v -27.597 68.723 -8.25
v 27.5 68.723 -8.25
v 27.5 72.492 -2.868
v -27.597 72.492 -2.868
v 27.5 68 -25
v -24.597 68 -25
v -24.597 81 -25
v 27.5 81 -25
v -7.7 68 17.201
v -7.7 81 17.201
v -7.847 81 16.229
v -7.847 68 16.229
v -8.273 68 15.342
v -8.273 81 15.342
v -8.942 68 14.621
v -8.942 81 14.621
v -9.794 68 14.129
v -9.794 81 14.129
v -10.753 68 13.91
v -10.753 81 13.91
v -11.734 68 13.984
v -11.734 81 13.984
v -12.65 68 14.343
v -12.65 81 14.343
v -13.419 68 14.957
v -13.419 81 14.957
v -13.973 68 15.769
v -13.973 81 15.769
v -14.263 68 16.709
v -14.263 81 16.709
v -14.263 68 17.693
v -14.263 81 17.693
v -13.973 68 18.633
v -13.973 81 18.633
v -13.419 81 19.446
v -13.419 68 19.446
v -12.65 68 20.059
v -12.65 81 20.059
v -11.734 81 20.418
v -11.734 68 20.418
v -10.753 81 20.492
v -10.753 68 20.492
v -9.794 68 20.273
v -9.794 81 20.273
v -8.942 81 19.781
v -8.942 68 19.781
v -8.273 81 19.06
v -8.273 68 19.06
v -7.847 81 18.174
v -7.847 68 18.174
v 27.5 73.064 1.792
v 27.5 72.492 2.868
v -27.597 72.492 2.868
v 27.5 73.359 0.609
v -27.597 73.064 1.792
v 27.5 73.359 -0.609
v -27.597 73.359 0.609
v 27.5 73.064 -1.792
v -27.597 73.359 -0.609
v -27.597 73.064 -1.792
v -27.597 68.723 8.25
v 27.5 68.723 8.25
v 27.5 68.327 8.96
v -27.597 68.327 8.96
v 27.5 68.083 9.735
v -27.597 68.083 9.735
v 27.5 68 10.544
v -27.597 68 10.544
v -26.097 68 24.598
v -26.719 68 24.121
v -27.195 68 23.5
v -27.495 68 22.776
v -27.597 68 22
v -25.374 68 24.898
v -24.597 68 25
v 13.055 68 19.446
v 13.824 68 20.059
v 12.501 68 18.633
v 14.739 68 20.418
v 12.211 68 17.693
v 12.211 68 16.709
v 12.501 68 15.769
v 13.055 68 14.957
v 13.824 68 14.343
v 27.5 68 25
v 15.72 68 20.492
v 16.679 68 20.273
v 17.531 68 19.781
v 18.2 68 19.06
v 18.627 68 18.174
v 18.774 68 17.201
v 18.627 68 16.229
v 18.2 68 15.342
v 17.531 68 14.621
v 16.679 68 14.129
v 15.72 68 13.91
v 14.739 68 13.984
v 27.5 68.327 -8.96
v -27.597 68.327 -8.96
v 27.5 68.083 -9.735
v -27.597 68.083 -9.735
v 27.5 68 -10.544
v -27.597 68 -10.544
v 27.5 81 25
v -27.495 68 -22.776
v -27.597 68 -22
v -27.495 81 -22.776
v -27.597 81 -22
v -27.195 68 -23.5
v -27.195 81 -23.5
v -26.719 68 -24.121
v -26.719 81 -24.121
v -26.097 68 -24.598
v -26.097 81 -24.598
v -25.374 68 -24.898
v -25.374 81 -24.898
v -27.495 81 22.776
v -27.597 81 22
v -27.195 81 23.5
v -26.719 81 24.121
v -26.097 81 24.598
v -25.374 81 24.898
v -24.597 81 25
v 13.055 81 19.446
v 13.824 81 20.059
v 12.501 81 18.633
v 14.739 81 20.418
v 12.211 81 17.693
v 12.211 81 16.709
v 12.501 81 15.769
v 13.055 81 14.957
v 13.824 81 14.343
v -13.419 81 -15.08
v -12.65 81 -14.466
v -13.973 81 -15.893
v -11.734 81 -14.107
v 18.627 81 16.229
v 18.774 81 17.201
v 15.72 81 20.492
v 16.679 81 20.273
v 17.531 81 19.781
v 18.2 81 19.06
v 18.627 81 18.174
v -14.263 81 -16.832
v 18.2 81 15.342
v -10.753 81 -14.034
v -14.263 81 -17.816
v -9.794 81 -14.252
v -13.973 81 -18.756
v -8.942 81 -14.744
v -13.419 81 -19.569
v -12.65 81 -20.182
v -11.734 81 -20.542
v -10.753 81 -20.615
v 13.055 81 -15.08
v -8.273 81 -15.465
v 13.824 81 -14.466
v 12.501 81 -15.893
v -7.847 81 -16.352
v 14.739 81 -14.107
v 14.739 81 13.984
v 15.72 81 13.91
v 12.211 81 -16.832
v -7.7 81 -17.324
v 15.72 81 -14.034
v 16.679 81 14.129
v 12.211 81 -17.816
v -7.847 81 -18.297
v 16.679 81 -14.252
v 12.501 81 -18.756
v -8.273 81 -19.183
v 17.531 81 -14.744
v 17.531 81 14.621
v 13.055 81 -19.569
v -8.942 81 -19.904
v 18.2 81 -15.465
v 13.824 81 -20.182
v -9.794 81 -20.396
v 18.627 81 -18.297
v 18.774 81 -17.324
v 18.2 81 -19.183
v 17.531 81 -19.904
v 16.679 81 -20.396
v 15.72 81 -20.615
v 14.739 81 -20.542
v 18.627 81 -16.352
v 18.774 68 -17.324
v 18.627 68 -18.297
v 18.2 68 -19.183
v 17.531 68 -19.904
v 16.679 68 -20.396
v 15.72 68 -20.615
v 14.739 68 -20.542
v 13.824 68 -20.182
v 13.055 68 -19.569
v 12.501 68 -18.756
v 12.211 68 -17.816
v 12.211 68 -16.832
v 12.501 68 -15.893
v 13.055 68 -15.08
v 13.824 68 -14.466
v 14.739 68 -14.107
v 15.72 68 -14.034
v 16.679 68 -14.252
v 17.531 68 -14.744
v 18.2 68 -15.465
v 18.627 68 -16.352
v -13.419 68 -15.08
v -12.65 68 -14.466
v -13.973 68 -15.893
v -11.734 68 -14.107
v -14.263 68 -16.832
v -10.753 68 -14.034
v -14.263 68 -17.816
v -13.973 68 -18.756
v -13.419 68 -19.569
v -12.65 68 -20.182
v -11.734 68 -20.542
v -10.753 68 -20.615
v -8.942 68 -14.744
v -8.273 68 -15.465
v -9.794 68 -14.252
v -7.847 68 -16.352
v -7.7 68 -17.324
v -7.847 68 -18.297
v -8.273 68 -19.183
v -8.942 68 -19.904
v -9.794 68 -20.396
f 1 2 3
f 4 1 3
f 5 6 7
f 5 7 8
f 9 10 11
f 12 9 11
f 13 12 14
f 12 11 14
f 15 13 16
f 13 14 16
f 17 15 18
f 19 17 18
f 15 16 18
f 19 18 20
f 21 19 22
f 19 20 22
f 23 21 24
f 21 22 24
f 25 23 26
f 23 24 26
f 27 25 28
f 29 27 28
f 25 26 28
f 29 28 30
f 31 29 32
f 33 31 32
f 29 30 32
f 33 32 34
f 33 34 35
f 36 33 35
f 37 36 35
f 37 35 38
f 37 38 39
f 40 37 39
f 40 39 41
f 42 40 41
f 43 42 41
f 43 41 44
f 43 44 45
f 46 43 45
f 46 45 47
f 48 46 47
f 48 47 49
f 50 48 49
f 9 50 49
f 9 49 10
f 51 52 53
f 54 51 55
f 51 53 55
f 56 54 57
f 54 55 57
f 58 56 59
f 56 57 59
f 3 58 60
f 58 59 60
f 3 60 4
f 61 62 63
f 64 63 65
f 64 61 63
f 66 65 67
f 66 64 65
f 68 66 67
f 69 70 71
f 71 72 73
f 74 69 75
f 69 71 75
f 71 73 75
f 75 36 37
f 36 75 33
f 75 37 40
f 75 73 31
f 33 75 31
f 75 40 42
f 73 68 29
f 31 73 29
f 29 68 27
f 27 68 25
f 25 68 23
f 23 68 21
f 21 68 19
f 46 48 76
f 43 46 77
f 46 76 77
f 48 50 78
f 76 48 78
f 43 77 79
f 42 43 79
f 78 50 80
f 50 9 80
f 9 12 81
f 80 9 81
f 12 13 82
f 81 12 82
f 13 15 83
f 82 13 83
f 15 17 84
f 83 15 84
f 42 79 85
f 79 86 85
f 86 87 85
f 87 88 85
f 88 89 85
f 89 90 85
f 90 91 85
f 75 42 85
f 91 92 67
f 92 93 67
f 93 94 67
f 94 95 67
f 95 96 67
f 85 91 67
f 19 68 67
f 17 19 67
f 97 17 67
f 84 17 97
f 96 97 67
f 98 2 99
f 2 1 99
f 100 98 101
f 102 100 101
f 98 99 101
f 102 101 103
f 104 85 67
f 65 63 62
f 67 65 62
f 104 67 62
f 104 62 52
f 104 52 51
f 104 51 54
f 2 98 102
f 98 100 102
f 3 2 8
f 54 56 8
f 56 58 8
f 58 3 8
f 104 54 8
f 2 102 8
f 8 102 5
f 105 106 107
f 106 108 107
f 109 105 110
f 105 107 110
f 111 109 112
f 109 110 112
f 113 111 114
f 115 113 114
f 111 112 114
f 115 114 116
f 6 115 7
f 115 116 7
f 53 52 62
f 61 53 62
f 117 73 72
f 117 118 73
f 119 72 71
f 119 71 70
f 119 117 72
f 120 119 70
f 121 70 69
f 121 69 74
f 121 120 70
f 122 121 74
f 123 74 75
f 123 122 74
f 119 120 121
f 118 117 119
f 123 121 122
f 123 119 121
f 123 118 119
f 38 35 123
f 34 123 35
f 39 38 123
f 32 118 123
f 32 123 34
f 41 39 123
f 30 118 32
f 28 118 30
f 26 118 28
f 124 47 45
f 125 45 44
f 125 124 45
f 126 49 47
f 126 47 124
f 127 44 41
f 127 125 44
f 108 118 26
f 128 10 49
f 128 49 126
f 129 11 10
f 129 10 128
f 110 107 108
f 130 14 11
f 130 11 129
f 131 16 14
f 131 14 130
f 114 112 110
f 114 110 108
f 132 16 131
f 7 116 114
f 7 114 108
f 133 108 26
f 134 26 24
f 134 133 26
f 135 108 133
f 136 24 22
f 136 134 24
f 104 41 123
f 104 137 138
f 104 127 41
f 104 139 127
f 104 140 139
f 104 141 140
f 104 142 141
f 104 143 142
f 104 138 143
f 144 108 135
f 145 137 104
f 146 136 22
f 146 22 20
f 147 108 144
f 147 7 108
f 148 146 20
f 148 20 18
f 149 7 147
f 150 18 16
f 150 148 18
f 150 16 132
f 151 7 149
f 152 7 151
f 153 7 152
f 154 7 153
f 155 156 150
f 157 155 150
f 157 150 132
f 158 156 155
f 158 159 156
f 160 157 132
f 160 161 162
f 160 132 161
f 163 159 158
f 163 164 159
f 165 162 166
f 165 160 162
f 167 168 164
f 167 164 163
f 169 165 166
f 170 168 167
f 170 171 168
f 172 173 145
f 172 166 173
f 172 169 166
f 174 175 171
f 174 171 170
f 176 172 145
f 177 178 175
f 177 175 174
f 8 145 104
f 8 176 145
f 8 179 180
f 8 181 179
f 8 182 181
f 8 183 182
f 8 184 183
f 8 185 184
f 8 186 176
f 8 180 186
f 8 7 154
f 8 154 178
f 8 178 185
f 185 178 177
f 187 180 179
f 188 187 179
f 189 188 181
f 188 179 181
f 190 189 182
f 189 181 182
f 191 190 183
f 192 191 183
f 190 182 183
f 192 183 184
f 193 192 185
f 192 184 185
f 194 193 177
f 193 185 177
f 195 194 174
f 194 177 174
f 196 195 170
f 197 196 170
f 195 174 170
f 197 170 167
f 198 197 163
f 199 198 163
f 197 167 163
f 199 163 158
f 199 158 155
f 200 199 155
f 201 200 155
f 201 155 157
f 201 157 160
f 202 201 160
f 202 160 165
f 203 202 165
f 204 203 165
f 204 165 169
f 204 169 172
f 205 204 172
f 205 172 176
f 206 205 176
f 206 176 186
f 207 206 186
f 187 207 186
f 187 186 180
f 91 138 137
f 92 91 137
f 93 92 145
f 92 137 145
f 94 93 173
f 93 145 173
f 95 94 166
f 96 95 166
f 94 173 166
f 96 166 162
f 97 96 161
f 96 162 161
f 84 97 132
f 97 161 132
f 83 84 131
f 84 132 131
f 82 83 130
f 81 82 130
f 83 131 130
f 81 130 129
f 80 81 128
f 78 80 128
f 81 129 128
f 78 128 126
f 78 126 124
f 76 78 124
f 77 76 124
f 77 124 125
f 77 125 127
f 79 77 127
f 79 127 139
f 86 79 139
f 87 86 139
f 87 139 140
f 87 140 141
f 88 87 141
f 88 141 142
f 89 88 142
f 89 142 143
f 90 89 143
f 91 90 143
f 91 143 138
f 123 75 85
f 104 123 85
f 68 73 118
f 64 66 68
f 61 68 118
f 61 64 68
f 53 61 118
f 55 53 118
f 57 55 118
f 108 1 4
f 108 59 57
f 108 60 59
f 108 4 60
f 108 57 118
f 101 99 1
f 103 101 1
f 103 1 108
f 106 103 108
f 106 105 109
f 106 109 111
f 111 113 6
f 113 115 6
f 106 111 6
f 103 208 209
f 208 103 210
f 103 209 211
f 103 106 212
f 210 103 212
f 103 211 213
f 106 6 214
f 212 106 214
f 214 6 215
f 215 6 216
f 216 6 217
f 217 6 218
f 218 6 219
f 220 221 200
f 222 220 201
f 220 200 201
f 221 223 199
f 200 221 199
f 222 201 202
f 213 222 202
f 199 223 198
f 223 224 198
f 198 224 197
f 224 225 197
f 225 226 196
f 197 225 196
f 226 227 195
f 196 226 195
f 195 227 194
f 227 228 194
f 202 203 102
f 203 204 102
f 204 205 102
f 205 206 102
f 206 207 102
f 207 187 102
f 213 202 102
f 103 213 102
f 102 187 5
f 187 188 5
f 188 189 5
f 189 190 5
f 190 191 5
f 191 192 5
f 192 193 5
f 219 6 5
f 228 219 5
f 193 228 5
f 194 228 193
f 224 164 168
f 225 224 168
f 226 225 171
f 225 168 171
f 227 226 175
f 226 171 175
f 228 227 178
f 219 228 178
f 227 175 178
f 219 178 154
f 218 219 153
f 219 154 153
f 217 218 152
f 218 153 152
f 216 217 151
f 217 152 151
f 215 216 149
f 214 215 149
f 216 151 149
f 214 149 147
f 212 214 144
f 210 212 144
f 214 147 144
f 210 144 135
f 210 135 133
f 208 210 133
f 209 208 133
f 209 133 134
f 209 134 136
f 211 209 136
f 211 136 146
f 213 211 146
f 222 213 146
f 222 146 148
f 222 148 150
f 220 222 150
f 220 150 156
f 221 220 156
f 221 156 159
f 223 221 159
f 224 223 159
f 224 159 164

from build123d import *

# Parameters (mm, degrees)
SKETCH6_W          = 55.097235346
SKETCH6_H          = 50
MAIN_BODY_DEPTH    = 13
MAIN_HOLE_DEPTH    = 56.097235346
EXTERIOR_FILLET_R  = 3
SKETCH9_R          = 3.3
BOLT_HOLES_DEPTH   = 14
TOP_HOLE_FILLET_R  = 5
SIDE_HOLE_FILLET_R = 4


with BuildPart() as part:
    # Sketch6 → Main Body (new body)
    with BuildSketch(Plane(origin=(0, 68, 0), x_dir=(1, 0, 0), z_dir=(0, 1, 0))):
        with Locations((-0.048617673, 0)):
            Rectangle(SKETCH6_W, SKETCH6_H)
    extrude(amount=MAIN_BODY_DEPTH)

    # Sketch7 → Main Hole (cut, through all)
    with BuildSketch(Plane(origin=(27.5, 0, 0), x_dir=(0, 0, -1), z_dir=(1, 0, 0))):
        Polygon((0, 74.5), (-9.282962044, 68), (0, 61.5), (9.282962044, 68), align=None)
    extrude(amount=-MAIN_HOLE_DEPTH, mode=Mode.SUBTRACT)

    # Exterior Fillet
    exterior_fillet_edges = [part.edges().sort_by_distance(p)[0] for p in [
        (-27.597235346, 74.5, 25),
        (-27.597235346, 74.5, -25),
    ]]
    fillet(exterior_fillet_edges, radius=EXTERIOR_FILLET_R)

    # Sketch9 → Bolt Holes (cut, through all)
    with BuildSketch(Plane(origin=(0, 81, 0), x_dir=(1, 0, 0), z_dir=(0, 1, 0))):
        with Locations((15.473743703, -17.201232435)):
            Circle(SKETCH9_R)
        with Locations((-11, -17.201232435)):
            Circle(SKETCH9_R)
        with Locations((15.473743703, 17.324336932)):
            Circle(SKETCH9_R)
        with Locations((-11, 17.324336932)):
            Circle(SKETCH9_R)
    extrude(amount=-BOLT_HOLES_DEPTH, mode=Mode.SUBTRACT)

    # Top Hole Fillet
    top_hole_fillet_edges = [part.edges().sort_by_distance(p)[0] for p in [
        (-0.048617673, 74.5, 0),
    ]]
    fillet(top_hole_fillet_edges, radius=TOP_HOLE_FILLET_R)

    # Side Hole Fillet
    side_hole_fillet_edges = [part.edges().sort_by_distance(p)[0] for p in [
        (-0.048617673, 68, -9.282962044),
        (-0.048617673, 68, 9.282962044),
    ]]
    fillet(side_hole_fillet_edges, radius=SIDE_HOLE_FILLET_R)


solid = part.part
